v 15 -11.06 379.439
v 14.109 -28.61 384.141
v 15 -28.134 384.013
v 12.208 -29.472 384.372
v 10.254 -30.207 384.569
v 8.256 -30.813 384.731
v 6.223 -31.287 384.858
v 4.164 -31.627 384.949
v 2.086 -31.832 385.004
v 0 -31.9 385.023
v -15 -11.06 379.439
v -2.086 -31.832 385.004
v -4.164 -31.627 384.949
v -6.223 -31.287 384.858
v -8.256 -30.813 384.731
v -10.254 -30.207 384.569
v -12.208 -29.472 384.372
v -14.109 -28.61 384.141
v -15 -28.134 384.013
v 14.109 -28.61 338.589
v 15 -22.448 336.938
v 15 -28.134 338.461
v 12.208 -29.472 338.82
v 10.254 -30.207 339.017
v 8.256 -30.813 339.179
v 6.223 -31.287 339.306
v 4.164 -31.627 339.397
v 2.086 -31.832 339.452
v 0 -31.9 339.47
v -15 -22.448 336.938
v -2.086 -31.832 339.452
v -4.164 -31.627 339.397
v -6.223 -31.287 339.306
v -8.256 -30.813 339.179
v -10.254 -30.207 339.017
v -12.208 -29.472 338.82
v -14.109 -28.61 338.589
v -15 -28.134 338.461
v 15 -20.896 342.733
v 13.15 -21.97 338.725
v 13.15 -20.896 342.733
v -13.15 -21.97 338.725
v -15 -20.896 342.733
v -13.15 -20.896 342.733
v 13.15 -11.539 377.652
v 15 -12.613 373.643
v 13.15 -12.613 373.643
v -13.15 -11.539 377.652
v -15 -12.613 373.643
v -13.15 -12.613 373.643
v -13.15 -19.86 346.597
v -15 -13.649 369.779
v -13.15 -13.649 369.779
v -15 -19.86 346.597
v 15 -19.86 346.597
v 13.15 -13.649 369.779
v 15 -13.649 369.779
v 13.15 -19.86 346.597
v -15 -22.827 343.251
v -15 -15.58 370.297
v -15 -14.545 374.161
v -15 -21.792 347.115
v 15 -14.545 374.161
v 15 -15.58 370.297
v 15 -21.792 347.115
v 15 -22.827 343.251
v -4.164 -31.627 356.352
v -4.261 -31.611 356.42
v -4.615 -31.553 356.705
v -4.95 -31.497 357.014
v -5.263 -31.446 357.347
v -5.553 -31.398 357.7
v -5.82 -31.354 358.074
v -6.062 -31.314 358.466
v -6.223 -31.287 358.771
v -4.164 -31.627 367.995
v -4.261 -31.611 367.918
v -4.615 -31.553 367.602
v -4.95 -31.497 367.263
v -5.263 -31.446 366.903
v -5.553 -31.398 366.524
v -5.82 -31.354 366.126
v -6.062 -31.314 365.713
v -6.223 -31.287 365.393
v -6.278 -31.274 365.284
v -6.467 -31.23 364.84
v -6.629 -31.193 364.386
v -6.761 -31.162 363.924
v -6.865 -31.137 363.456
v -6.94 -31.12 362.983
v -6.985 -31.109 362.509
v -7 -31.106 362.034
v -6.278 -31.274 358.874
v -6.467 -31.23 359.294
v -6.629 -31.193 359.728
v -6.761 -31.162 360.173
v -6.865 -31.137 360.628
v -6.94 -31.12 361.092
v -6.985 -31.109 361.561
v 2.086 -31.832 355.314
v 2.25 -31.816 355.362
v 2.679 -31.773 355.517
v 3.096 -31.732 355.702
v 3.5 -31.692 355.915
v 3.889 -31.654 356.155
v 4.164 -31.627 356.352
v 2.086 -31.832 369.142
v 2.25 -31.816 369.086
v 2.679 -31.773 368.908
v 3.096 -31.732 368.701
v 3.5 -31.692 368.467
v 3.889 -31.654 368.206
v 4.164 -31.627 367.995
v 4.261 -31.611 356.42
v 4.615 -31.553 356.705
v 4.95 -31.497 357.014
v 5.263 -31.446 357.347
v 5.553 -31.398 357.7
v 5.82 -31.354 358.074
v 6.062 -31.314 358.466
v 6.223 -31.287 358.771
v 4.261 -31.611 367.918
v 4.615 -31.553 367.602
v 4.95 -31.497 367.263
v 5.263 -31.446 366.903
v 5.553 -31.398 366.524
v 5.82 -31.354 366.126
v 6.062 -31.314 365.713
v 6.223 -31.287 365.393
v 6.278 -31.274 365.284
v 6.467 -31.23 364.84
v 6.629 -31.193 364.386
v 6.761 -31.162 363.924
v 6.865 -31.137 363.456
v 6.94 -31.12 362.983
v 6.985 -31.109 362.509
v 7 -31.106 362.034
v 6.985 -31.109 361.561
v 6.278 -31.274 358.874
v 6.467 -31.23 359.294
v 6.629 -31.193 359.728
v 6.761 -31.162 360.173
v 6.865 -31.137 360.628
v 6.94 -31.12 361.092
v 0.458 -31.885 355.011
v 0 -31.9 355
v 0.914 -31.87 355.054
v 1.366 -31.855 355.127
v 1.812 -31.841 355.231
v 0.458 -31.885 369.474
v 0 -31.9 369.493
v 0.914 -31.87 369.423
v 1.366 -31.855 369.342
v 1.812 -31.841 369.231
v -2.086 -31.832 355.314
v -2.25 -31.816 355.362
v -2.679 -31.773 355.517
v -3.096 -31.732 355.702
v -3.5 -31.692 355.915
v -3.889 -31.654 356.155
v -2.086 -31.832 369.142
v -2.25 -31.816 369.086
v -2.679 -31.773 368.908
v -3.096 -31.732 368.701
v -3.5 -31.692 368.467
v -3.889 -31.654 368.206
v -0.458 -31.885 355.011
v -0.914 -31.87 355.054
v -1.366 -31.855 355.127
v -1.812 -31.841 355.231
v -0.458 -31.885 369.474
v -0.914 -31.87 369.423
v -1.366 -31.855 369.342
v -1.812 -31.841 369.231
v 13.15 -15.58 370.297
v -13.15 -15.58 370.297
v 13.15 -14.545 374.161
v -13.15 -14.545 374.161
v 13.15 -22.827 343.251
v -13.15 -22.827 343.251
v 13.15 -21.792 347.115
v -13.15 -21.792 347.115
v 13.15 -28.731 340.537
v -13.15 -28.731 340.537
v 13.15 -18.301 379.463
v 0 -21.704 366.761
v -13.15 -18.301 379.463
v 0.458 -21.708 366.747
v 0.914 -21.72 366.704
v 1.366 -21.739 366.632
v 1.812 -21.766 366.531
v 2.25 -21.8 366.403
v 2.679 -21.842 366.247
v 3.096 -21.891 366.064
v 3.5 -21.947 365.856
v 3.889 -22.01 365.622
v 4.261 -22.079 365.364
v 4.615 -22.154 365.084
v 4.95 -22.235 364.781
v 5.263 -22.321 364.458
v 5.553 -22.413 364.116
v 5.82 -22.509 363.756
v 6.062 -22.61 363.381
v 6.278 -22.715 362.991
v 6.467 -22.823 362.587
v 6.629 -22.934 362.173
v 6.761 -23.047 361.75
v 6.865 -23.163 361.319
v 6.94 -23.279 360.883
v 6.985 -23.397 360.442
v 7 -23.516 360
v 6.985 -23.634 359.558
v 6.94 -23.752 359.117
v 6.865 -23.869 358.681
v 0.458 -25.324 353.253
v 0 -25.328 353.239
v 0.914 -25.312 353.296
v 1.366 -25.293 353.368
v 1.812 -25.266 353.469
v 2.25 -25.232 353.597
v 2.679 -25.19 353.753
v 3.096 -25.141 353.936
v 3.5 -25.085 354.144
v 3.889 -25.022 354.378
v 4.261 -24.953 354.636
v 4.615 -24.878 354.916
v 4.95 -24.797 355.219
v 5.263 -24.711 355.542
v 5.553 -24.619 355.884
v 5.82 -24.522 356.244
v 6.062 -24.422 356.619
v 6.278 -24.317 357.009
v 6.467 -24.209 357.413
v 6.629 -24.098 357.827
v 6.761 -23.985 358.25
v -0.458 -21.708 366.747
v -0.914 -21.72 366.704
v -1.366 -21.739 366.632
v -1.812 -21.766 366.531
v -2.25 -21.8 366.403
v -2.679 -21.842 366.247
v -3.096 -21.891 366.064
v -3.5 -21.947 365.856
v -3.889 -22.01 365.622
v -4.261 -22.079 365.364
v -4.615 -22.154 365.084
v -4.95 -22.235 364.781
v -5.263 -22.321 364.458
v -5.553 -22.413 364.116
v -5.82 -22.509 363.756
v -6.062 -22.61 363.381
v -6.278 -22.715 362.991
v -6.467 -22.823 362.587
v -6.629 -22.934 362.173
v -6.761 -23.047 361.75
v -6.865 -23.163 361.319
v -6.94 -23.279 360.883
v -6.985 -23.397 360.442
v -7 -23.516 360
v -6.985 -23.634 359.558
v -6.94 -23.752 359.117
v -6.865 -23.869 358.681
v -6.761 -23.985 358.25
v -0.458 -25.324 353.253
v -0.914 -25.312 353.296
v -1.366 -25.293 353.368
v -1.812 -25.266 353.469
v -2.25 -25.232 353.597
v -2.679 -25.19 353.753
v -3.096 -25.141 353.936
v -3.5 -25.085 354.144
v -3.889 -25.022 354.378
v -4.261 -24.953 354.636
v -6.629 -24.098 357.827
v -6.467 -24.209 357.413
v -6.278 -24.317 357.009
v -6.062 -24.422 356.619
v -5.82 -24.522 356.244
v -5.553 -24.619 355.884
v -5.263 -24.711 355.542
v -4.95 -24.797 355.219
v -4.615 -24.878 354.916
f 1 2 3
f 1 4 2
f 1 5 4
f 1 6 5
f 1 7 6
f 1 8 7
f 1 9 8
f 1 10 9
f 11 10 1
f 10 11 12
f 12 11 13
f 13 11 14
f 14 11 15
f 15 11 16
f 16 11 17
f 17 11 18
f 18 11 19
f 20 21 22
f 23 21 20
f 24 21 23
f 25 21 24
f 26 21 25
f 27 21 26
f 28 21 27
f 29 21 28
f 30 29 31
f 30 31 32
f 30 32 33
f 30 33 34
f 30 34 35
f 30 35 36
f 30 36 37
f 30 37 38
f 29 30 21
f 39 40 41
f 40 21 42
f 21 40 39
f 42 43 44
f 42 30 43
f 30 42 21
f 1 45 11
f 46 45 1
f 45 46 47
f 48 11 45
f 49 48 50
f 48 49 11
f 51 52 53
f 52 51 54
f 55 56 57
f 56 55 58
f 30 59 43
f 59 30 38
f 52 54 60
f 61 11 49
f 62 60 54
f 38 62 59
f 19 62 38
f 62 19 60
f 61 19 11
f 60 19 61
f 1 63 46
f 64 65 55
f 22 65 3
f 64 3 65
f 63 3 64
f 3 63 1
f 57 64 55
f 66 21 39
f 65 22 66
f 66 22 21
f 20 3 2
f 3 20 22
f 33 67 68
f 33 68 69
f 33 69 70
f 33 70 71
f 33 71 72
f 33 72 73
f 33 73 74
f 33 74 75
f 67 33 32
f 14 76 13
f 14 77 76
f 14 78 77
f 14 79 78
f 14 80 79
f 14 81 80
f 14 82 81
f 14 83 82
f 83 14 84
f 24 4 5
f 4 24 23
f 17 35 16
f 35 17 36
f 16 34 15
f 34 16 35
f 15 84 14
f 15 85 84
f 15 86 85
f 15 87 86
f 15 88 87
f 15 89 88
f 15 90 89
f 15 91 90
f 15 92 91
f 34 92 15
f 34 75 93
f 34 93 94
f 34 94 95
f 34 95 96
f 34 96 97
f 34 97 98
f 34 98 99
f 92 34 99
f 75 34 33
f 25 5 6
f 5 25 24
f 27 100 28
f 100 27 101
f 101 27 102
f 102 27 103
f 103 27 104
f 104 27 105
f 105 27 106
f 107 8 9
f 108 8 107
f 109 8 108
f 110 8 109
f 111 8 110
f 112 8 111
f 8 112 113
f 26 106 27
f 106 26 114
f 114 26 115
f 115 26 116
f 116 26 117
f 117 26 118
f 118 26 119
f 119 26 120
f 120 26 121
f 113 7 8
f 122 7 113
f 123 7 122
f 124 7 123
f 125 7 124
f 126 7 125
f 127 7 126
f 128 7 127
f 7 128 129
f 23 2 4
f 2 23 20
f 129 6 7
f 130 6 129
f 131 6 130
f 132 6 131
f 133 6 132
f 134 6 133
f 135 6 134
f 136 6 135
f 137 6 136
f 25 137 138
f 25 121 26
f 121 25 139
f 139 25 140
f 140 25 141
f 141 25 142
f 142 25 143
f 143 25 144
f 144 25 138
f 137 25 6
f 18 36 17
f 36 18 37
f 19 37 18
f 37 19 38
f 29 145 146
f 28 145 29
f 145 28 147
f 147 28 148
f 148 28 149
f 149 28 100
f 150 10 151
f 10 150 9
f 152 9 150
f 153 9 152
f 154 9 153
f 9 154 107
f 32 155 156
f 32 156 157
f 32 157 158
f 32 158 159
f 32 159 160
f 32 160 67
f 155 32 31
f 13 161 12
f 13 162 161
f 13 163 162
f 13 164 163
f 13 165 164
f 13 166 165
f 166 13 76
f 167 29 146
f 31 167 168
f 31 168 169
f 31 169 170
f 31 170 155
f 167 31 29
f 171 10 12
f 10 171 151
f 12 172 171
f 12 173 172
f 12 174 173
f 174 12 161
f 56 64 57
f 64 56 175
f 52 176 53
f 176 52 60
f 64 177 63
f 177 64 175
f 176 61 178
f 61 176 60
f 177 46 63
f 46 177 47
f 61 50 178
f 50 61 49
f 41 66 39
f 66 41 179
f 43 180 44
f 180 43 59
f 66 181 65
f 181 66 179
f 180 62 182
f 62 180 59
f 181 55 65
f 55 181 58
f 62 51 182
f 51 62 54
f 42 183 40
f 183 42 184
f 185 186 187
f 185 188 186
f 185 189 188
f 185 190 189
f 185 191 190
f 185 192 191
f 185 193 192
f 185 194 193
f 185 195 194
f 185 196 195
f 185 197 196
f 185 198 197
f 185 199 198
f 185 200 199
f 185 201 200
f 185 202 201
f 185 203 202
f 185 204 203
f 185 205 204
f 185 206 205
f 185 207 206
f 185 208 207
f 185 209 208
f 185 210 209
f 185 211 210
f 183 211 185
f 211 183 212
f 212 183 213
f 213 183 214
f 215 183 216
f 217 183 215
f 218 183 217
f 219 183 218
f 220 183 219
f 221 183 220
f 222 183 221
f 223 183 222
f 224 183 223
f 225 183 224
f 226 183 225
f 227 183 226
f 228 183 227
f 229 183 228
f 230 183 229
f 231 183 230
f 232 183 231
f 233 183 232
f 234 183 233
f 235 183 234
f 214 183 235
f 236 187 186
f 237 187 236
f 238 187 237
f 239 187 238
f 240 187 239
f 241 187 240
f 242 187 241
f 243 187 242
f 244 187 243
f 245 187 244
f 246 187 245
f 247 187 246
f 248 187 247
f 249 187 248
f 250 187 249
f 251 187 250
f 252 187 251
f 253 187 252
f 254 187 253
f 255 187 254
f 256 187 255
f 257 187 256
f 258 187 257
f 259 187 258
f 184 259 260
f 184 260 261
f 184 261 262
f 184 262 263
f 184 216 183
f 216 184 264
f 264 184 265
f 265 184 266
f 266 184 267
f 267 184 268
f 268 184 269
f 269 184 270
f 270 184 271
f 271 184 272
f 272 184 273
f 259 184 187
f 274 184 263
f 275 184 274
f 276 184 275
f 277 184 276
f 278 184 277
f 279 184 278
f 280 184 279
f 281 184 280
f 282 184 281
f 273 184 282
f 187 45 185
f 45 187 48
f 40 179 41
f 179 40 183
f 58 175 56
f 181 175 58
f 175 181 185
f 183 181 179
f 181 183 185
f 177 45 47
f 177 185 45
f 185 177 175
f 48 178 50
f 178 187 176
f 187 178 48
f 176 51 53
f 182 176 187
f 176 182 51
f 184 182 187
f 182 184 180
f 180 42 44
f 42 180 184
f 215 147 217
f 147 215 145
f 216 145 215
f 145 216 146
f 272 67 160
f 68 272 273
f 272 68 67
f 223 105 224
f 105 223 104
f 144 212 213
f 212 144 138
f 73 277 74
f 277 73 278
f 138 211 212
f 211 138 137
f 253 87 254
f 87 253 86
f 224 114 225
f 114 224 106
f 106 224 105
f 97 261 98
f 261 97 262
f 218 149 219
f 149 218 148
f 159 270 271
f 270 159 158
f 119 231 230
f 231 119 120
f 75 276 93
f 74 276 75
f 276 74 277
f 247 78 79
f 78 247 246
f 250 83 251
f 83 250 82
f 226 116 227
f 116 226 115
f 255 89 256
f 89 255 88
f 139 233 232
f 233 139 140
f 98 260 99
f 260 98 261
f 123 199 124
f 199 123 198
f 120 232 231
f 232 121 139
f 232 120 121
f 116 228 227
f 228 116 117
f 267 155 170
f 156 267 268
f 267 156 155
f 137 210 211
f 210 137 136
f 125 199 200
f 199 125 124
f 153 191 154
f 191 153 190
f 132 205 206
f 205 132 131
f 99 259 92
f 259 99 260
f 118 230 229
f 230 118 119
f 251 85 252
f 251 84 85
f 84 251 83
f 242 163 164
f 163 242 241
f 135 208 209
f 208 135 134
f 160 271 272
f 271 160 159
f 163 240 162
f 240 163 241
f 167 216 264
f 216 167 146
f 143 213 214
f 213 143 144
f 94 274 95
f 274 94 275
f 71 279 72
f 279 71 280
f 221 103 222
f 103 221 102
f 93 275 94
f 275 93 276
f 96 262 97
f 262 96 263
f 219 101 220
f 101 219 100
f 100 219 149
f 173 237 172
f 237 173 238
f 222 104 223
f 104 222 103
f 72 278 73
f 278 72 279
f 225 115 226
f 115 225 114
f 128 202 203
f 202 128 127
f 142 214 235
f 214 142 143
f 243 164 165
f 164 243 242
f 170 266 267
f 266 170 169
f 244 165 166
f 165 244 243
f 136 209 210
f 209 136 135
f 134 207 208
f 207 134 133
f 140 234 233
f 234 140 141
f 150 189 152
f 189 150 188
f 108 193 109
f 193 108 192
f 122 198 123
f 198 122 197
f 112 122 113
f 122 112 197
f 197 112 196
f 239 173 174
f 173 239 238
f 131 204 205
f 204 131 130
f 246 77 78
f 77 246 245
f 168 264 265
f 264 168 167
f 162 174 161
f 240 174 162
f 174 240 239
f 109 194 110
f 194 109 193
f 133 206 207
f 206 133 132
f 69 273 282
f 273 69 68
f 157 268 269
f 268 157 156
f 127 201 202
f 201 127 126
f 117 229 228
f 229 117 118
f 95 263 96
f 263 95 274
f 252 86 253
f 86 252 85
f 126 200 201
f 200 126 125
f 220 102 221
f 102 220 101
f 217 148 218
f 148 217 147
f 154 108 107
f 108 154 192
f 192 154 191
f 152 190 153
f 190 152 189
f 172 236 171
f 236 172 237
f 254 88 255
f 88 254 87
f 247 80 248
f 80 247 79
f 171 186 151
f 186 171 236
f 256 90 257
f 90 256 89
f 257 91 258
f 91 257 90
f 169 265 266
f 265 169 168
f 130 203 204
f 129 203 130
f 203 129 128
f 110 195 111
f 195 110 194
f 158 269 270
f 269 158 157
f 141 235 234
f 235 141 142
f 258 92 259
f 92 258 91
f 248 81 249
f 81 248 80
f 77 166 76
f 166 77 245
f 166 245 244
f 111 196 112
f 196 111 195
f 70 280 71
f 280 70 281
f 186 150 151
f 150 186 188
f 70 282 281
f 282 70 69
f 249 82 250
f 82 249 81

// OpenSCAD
// file: ../lib/astra66_core.scad
// =============================================================================
// ASTRA-66 CAD rev B -- core library
// Parameters (generated from analysis.py by build.py), derived stations and helpers.
// Every part file includes this; stations mirror analysis.py X[] exactly.
//
// Frame: rocket axis = +Z, STA 0 = nose tip, stations increase aft.
// Angles: measured about +Z from +X toward +Y.  90 deg = switch / hatch side,
// 270 deg = camera side, 45 deg = rail-button line, fins at 0/90/180/270 deg.
// =============================================================================
include <../astra66_params.scad>

$fn = FN;
EPS = 0.01;
CAD_REV = "B";

// ----------------------------------------------------------------- radii
R_OD    = BODY_OD / 2;                 // body tube outer
R_ID    = BODY_ID / 2;                 // body tube inner
R_SH    = (BODY_ID - FIT_SH) / 2;      // printed shoulder / ring OD radius
R_SI    = R_SH - NC_SH_WALL;           // nose shoulder inner radius
R_CO    = CPL_OD / 2;                  // coupler outer
R_CI    = CPL_ID / 2;                  // coupler inner
R_BH_IN = (CPL_ID - 0.2) / 2;          // inner bulkhead disc (fits in coupler)
R_MO    = MMT_OD / 2;
R_MI    = MMT_ID / 2;
R_RING_BORE = (MMT_OD + FIT_SH) / 2;   // centering-ring / core bore
R_TAB_FLOOR = max(R_MO, RET_CLEAR_D / 2);          // rev B: tab clears the COTS retainer
FIN_TAB_H   = R_OD - R_TAB_FLOOR - FIN_TAB_CLR;

// ----------------------------------------------------------------- stations
X_NC_BASE     = NC_L;
X_SH_END      = NC_L + NC_SH_L;
X_PL_END      = NC_L + PL_L;
X_BAND_END    = X_PL_END + AV_BAND_L;
X_END         = X_BAND_END + BO_L;
L_OVERALL     = X_END;                              // airframe length (excl. COTS retainer)
X_CPL_FWD     = X_PL_END - AV_INS;
X_CPL_AFT     = X_BAND_END + AV_INS;
X_AVB_FWD_OUT = X_CPL_FWD - AV_BH_T;                // AV-303 forward face
X_AVB_AFT_OUT = X_CPL_AFT + GASKET_T;               // AV-304 outer-disc forward face
X_AVB_AFT_END = X_AVB_AFT_OUT + AV_BH_T;            // AV-304 aft face (recovery bay starts)
X_SLED_FWD    = X_CPL_FWD + AV_BH_T + SLED_FWD_GAP;
X_SLED_AFT    = X_SLED_FWD + SLED_L;
X_MMT_AFT     = X_END + MMT_AFT_EXT;
X_MMT_FWD     = X_MMT_AFT - MMT_L;
X_FIN_LE      = X_END - FIN_CR;
X_TAB_FWD     = X_FIN_LE + FIN_TAB_FWD;
X_TAB_AFT     = X_END - LOCK_T;
X_CORE_FWD    = X_TAB_FWD - CORE_RING_T;
X_CORE_AFT    = X_END - LOCK_T;
X_NC_SCREW    = NC_L + NC_SH_L / 2;
X_CAM         = X_SH_END + CAM_OFF;
X_HATCH       = X_SH_END + HATCH_OFF;
X_RB_FWD      = X_MMT_FWD - RB_FWD_OFF;
X_RB_AFT      = X_END - RB_AFT_OFF;
X_TRAY_FWD    = X_AVB_FWD_OUT - TRAY_L;
X_SW          = X_PL_END + AV_BAND_L / 2;
X_MOTOR_FWD   = X_MMT_AFT - MOTOR_L;
X_BAT0        = X_SLED_FWD + 2;
BAT_CAGE_L    = 12 + BAT_L + 0.6;
PAYLOAD_BAY_L  = X_AVB_FWD_OUT - X_SH_END;
RECOVERY_BAY_L = X_MMT_FWD - X_AVB_AFT_END;

FIN_ANGLES      = [for (i = [0 : FIN_N - 1]) i * 360 / FIN_N];
LOCK_SCREW_ANG  = [45, 135, 225, 315];
STATIC_PORT_ANG = [45, 135, 225, 315];

// ----------------------------------------------------------------- geometry helpers
function ogive_rho()  = (R_OD * R_OD + NC_L * NC_L) / (2 * R_OD);
function ogive_r(x)   = sqrt(max(pow(ogive_rho(), 2) - pow(NC_L - x, 2), 0)) + R_OD - ogive_rho();

// Solid of revolution of the tangent ogive between stations x0..x1, radially offset inward by off.
module ogive_solid(x0, x1, off = 0, n = 72) {
    s = (x0 == 0) ? 1 : 0;
    rotate_extrude()
        polygon(concat([[0, x0]],
                       [for (i = [s : n]) let(x = x0 + (x1 - x0) * i / n) [max(ogive_r(x) - off, 0.01), x]],
                       [[0, x1]]));
}

module tube_r(ro, ri, z0, z1) {
    translate([0, 0, z0]) difference() {
        cylinder(r = ro, h = z1 - z0);
        translate([0, 0, -1]) cylinder(r = ri, h = z1 - z0 + 2);
    }
}

module at_angle(a) { rotate([0, 0, a]) children(); }

// Cylinder of diameter d along the radial direction at angle a, from radius r0 to r1, at station z.
module radial_cyl(d, z, a, r0, r1) {
    at_angle(a) translate([r0, 0, z]) rotate([0, 90, 0]) cylinder(d = d, h = r1 - r0);
}

module rounded_rect(l, w, r) { offset(r = r) square([l - 2 * r, w - 2 * r], center = true); }

// Radial prism with a rounded-rectangle footprint (l axial x w tangential) centred at station z.
module radial_prism(a, z, l, w, rr, r0, r1) {
    at_angle(a) translate([r0, 0, z]) rotate([0, 90, 0]) linear_extrude(r1 - r0) rounded_rect(l, w, rr);
}

// Block in the radial frame at angle a: radial r0..r1, tangential +/-hw, stations z0..z1, clipped to radius rc.
module radial_block(a, r0, r1, hw, z0, z1, rc) {
    intersection() {
        at_angle(a) translate([r0, -hw, z0]) cube([r1 - r0, 2 * hw, z1 - z0]);
        translate([0, 0, z0 - 1]) cylinder(r = rc, h = z1 - z0 + 2);
    }
}

// Camera frame: child +Z = lens axis (outward, tilted CAM_TILT aft), origin at the lens face centre.
// Lens-face radius CAM_R0 is the smaller of (a) the tilted barrel rim 0.5 mm inside the bore and
// (b) the tilted camera-body corners 0.5 mm inside the bore -- so any CAM_W/CAM_LEN entered fits.
CAM_SETBACK = CAM_LENS_L * cos(CAM_TILT) + (CAM_LENS_HOLE - 1) / 2 * sin(CAM_TILT) + 0.5;
CAM_R0 = min(R_ID - CAM_SETBACK, sqrt(pow(R_ID - 0.5, 2) - pow(CAM_W / 2, 2)) - CAM_LEN / 2 * sin(CAM_TILT));
module cam_frame() {
    at_angle(CAM_ANG) translate([CAM_R0, 0, X_CAM]) rotate([0, 90 - CAM_TILT, 0]) children();
}

echo(str("ASTRA-66 CAD rev ", CAD_REV, ": L_OVERALL=", L_OVERALL, " payload bay=", PAYLOAD_BAY_L,
         " recovery bay=", RECOVERY_BAY_L, " fin tab depth=", FIN_TAB_H));
// main file
// ASTRA-66 CAD rev B -- PL-203 Camera cradle (camera mount)
// Holds a camera of CAM_W x CAM_H x CAM_LEN (USER placeholders) with its lens axis tilted CAM_TILT aft,
// concentric with the PL-201 lens hole. Saddle bonded to the tube wall; camera drops in from the axis side
// and is retained by a zip tie through the two end notches.
// PETG, FDM.
include <../lib/astra66_core.scad>

module PL_203_camera_cradle() {
    difference() {
        intersection() {
            cam_frame() translate([-CAM_LEN / 2 - 2, -CAM_W / 2 - 2, -CAM_H / 2]) cube([CAM_LEN + 4, CAM_W + 4, CAM_H / 2 + CAM_LENS_L + 10]);
            translate([0, 0, X_CAM - 60]) cylinder(r = R_ID - 0.1, h = 120);
        }
        cam_frame() {
            translate([-CAM_LEN / 2 - 0.15, -CAM_W / 2 - 0.15, -CAM_H - 1]) cube([CAM_LEN + 0.3, CAM_W + 0.3, CAM_H + 1]);  // body pocket
            translate([0, 0, -1]) cylinder(d = CAM_LENS_HOLE, h = 30);                                                   // lens bore
            for (s = [-1, 1]) translate([s * (CAM_LEN / 2 - 6) - 2, -CAM_W / 2 - 3, -CAM_H / 2 - 1]) cube([4, CAM_W + 6, 3]); // tie notches
        }
    }
}

PL_203_camera_cradle();
